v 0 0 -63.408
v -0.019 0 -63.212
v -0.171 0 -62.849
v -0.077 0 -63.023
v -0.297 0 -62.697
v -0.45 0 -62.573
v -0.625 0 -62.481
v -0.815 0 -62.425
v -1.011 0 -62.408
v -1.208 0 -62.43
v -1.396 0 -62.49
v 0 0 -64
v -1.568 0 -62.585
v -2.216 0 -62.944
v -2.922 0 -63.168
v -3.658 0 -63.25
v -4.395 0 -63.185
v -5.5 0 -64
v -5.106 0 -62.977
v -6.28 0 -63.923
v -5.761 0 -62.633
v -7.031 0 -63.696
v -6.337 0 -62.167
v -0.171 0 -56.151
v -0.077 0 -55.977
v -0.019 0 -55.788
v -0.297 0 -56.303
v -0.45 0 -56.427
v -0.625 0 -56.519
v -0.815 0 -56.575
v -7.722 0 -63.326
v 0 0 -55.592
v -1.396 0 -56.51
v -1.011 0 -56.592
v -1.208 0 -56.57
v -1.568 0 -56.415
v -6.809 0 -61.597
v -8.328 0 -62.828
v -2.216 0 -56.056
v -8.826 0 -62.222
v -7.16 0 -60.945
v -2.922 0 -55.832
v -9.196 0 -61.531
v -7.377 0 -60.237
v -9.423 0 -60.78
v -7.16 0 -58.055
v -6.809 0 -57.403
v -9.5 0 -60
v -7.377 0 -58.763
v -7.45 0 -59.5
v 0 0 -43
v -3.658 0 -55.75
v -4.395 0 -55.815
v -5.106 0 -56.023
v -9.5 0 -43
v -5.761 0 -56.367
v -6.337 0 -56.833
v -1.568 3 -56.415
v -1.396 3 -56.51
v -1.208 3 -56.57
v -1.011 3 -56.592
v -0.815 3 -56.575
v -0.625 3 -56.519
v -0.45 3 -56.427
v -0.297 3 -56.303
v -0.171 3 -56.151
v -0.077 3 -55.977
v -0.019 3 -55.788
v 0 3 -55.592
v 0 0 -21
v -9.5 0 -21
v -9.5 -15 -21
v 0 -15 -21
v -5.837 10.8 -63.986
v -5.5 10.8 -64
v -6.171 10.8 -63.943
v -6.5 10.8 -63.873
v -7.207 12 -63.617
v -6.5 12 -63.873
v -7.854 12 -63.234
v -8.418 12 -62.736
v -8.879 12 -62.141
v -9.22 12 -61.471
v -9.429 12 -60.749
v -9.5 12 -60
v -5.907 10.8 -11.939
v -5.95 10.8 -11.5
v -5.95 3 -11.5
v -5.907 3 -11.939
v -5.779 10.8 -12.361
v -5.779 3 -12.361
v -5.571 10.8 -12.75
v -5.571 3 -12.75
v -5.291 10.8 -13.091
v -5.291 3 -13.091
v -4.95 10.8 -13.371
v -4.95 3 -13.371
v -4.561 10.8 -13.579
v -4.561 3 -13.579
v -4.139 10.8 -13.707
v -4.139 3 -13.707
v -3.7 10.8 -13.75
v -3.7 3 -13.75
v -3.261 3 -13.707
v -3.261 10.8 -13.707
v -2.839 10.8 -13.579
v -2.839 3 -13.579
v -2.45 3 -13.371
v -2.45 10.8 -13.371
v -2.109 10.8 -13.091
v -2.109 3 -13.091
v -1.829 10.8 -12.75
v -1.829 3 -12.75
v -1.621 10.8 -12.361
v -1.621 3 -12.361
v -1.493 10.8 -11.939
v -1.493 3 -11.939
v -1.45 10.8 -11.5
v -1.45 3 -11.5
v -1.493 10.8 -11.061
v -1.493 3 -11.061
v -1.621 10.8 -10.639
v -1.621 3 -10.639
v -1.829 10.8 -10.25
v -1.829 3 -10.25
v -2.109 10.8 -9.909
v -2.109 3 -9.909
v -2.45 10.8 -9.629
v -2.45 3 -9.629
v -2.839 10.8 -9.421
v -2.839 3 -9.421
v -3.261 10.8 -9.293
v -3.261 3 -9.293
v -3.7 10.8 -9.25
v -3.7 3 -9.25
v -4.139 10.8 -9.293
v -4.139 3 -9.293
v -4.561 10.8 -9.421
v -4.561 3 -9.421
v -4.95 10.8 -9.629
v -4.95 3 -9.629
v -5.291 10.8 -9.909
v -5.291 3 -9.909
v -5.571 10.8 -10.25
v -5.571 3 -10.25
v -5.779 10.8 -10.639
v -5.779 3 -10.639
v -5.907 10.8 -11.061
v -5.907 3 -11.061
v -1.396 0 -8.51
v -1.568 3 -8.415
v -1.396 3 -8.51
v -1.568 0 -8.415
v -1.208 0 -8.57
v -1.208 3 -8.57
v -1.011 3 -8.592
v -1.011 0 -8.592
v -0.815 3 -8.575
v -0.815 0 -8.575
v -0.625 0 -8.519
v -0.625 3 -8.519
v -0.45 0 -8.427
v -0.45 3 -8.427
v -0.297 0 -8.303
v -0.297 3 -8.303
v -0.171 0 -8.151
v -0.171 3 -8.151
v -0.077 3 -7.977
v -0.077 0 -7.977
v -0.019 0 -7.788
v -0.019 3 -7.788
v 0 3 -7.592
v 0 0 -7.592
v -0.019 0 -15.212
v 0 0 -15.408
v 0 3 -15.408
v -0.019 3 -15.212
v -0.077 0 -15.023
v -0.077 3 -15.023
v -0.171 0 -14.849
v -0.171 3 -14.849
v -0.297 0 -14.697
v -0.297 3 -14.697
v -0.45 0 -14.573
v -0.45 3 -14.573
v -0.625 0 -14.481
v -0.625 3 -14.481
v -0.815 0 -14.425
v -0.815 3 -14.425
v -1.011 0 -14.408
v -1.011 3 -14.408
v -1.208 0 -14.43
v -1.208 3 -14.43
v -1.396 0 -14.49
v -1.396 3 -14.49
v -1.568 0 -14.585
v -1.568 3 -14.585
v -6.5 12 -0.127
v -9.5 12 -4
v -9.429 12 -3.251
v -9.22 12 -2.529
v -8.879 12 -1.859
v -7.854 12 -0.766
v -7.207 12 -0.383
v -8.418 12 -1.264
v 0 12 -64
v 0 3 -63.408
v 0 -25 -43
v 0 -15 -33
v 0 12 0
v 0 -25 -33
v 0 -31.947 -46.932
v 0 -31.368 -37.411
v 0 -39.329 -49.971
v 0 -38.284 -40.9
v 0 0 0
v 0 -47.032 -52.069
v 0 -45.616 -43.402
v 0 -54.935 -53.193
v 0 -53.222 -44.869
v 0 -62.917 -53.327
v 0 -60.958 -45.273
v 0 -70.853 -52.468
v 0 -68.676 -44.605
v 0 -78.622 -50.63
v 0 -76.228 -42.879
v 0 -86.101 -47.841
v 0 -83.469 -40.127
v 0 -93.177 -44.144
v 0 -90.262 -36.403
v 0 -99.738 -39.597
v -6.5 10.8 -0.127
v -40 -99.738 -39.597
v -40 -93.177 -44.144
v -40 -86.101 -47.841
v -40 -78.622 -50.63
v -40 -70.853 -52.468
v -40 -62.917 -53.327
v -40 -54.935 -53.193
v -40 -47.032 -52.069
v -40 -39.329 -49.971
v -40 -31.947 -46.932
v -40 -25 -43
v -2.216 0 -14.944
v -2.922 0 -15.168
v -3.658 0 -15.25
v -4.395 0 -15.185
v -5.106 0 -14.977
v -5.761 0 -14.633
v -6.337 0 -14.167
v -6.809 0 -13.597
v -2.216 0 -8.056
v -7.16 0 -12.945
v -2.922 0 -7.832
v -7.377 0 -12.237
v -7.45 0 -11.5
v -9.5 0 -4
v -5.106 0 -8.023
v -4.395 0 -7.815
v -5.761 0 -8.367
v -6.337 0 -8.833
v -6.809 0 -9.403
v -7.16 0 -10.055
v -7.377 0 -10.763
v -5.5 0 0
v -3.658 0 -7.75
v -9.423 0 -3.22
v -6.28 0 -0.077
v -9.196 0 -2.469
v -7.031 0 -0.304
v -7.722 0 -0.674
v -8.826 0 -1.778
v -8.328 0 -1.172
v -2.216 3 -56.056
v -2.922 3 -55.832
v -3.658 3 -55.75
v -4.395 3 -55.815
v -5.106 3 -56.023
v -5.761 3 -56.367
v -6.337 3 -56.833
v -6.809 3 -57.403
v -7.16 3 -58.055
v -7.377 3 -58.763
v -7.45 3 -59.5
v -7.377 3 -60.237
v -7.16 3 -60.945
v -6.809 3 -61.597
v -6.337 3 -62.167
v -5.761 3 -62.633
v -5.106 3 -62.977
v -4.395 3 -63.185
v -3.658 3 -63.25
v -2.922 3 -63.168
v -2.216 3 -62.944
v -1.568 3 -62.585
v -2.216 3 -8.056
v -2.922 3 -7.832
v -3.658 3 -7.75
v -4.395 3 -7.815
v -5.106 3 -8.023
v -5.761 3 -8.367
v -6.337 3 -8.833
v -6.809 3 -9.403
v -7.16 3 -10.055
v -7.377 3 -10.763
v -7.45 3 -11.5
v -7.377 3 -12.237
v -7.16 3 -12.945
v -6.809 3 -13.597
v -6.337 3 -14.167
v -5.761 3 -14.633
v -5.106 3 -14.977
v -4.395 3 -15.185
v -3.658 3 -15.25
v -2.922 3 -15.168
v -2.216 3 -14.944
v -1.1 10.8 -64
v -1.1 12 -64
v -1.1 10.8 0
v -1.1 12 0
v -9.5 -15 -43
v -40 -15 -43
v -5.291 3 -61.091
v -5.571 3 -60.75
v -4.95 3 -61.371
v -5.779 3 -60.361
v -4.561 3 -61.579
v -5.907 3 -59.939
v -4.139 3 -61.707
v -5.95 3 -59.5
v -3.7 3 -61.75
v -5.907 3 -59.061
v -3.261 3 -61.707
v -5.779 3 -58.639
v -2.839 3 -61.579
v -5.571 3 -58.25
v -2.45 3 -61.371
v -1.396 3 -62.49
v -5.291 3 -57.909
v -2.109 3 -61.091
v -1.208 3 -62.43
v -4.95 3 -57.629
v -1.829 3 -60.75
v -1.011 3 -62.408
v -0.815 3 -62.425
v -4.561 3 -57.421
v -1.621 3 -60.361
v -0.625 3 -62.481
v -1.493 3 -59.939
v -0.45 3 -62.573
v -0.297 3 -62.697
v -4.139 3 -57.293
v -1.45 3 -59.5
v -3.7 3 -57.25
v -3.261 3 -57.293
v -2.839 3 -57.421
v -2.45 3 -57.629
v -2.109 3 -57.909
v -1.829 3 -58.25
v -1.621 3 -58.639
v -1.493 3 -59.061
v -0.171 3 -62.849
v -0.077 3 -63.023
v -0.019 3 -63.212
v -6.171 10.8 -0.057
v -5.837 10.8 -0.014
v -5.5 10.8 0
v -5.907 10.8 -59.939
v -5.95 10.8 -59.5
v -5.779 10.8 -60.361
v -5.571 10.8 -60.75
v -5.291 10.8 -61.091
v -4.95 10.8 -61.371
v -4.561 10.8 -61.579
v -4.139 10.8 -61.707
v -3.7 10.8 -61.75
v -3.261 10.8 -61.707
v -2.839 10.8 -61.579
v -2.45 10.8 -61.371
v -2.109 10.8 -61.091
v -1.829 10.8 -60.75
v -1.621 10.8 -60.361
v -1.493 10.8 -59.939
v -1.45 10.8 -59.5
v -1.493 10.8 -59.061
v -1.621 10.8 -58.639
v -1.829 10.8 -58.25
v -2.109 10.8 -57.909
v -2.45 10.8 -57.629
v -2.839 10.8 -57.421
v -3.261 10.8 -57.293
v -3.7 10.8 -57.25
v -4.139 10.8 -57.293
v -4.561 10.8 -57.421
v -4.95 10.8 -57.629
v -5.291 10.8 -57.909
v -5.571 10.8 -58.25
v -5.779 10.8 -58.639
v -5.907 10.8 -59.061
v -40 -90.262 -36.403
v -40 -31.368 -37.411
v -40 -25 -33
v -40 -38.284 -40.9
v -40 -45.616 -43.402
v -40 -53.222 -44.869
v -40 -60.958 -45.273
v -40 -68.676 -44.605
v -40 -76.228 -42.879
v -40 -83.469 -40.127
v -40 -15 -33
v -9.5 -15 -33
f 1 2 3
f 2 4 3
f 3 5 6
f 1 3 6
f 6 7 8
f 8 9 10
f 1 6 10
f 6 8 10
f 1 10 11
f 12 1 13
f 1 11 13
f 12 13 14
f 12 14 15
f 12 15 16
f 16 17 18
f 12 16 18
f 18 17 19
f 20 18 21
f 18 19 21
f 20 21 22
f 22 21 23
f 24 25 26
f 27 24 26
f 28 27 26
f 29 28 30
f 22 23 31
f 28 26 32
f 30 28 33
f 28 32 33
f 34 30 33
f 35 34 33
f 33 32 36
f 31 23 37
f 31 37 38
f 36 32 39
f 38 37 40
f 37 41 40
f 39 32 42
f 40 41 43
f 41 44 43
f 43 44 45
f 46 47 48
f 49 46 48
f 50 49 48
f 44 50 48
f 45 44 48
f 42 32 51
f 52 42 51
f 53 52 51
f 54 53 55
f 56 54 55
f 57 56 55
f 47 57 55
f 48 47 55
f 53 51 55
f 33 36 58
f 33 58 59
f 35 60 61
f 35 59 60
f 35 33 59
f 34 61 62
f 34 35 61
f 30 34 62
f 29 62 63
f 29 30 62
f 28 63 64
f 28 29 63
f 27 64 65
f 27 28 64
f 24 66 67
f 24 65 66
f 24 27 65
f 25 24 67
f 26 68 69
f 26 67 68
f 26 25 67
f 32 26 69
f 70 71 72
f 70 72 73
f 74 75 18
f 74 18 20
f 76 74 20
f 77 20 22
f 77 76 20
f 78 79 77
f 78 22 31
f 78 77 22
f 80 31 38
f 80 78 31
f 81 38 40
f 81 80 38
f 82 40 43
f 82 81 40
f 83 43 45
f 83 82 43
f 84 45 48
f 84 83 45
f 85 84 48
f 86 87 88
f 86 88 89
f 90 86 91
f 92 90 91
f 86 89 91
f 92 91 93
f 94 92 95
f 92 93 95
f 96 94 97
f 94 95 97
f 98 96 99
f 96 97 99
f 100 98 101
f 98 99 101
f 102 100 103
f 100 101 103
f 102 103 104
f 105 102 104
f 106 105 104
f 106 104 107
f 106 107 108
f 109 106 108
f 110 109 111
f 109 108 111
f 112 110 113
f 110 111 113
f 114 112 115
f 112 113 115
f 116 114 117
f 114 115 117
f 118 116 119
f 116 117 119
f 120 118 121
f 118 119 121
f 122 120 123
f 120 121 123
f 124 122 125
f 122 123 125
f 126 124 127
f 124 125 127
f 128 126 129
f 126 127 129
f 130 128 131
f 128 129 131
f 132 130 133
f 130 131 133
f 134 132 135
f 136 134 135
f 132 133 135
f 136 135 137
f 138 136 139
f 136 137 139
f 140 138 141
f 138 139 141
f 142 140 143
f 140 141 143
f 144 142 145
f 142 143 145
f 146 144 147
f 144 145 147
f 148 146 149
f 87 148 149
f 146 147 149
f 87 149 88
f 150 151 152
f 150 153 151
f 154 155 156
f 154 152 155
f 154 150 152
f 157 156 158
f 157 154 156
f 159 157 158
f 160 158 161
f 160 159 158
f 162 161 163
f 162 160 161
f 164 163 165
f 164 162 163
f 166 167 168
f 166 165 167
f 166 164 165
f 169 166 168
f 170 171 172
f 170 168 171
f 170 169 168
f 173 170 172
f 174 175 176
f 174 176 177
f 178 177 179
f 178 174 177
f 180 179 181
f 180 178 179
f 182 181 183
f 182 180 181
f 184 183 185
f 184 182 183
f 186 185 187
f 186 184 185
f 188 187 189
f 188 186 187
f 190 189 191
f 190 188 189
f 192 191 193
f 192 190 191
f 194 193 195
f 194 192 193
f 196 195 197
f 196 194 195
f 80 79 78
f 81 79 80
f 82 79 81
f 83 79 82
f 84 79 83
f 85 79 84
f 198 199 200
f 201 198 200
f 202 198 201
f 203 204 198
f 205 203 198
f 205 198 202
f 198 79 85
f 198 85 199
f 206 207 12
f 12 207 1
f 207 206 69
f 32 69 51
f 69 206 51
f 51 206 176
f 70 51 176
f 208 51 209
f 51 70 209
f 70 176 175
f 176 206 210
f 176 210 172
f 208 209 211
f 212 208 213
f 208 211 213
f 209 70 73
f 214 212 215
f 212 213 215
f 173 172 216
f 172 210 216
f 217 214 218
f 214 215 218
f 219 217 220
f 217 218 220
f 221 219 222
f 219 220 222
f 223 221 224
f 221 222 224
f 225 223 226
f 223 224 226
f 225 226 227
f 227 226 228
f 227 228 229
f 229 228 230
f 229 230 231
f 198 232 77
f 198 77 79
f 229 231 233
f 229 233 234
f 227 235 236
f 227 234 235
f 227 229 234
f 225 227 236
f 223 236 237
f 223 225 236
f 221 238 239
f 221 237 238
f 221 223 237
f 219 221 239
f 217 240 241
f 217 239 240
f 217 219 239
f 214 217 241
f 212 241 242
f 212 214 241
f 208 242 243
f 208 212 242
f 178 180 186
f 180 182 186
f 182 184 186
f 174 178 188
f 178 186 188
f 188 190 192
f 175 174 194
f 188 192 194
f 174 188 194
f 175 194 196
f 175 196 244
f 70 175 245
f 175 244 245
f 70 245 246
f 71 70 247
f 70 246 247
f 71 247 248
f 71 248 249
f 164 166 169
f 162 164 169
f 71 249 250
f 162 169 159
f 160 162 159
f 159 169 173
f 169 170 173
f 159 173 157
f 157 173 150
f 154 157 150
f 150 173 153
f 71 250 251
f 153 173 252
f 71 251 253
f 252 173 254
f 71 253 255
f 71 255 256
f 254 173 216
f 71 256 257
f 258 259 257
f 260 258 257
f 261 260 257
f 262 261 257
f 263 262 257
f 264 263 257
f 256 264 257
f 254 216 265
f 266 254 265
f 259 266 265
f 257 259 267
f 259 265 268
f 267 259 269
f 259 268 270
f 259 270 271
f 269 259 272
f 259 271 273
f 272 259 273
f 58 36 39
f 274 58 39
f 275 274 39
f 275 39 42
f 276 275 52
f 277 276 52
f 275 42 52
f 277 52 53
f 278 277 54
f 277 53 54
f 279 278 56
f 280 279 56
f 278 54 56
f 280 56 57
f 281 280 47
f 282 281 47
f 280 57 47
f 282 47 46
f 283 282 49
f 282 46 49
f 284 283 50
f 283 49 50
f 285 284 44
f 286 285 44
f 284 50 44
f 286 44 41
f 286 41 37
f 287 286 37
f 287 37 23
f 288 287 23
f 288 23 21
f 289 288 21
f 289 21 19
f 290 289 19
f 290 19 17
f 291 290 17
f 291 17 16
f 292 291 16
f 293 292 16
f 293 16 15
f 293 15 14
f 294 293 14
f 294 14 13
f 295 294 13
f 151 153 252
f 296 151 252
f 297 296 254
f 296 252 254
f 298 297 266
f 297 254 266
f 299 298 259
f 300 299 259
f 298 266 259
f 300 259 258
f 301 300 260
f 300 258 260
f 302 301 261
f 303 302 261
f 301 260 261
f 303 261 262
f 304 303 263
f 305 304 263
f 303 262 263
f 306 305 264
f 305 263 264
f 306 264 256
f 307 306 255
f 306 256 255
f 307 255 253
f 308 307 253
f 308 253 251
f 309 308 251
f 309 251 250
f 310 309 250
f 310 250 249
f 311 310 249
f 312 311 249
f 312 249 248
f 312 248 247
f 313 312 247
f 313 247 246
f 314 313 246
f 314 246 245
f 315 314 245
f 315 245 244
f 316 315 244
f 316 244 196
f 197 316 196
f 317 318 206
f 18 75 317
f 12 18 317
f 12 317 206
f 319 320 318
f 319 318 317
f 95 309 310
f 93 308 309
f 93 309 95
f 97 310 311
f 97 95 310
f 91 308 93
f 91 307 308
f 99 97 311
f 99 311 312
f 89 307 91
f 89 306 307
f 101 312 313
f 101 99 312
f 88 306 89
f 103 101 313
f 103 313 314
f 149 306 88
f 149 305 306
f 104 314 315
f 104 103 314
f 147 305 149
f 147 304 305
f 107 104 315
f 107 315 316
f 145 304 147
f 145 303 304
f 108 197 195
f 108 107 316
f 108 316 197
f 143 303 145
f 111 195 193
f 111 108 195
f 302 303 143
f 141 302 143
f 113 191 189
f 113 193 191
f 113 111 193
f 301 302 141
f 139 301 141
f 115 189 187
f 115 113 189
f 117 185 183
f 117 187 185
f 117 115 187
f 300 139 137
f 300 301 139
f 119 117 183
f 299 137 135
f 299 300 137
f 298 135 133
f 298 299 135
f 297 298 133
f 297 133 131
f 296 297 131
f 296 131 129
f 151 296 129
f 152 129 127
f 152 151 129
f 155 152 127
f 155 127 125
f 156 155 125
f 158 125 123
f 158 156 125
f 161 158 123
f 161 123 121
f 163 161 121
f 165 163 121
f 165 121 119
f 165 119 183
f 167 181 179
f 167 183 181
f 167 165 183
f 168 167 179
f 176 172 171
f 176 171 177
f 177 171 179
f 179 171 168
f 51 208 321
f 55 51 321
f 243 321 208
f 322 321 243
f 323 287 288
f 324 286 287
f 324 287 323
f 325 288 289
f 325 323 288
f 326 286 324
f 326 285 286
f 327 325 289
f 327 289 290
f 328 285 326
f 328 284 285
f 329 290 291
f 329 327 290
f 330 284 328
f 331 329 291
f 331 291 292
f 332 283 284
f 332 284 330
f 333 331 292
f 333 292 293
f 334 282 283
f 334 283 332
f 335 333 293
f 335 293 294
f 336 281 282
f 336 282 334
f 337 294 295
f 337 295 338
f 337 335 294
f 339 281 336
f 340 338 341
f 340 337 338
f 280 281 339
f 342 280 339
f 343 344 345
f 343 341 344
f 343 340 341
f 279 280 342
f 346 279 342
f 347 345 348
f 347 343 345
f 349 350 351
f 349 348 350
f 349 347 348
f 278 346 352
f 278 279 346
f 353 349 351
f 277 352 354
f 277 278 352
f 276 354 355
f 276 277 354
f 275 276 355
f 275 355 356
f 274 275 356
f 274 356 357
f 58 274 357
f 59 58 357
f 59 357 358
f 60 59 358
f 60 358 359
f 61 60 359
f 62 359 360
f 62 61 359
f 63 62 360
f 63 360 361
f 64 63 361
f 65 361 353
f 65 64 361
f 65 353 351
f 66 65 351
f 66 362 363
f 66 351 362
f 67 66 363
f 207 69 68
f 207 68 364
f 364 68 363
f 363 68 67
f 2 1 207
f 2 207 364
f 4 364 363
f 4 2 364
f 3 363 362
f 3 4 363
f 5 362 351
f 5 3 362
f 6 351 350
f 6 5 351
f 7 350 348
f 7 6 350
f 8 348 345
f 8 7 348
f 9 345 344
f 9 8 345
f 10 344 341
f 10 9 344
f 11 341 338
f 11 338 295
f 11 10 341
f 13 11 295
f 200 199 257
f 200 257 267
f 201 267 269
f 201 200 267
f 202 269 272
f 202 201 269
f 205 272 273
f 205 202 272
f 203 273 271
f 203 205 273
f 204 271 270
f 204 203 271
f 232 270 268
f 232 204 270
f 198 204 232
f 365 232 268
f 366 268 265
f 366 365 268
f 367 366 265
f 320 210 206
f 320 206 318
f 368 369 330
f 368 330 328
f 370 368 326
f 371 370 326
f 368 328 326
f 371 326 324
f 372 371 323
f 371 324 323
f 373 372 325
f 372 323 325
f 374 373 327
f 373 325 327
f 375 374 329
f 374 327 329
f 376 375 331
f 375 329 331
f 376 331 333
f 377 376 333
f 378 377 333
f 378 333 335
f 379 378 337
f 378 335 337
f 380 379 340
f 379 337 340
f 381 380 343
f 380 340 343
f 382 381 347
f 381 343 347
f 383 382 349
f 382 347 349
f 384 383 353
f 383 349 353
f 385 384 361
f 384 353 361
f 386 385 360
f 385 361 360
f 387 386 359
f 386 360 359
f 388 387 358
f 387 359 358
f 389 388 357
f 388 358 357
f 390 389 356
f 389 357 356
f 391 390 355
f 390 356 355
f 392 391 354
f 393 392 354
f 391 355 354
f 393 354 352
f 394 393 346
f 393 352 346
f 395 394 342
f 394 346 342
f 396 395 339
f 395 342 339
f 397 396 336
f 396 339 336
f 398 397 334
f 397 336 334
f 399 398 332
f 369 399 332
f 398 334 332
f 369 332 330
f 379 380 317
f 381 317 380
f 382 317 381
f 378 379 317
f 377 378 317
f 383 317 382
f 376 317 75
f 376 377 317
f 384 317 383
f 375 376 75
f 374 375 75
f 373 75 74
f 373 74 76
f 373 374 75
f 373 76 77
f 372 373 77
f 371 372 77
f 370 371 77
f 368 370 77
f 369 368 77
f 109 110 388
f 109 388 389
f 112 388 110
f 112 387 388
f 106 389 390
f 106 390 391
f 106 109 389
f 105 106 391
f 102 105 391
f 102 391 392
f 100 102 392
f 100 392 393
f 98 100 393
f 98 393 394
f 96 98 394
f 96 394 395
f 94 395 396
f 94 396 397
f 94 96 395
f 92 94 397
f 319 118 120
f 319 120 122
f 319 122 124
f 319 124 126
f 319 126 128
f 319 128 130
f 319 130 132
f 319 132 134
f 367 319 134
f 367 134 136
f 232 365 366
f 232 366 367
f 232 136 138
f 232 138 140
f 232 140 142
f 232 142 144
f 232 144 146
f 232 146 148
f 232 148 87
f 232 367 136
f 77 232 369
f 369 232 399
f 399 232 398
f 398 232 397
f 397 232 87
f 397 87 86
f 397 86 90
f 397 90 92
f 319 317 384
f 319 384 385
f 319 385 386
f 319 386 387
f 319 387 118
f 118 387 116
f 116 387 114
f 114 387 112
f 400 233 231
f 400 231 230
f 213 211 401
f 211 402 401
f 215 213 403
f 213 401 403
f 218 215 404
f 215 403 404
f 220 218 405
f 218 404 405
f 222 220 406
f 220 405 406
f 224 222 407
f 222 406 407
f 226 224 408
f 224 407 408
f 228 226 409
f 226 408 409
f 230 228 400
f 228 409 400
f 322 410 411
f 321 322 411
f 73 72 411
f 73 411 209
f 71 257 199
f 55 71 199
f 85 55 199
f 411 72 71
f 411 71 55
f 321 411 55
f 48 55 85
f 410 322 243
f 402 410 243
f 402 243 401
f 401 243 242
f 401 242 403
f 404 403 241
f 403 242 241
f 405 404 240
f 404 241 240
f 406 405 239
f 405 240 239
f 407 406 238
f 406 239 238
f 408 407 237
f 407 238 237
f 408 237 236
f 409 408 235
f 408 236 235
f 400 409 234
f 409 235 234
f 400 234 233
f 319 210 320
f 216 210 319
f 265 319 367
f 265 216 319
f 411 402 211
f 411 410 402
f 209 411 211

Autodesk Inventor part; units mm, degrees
ref_plane "YZ Plane" through (0, 0, 0) normal (1, 0, 0) x (0, 1, 0)
ref_plane "XZ Plane" through (0, 0, 0) normal (0, 1, 0) x (-1, 0, 0)
ref_plane "XY Plane" through (0, 0, 0) normal (0, 0, 1) x (1, 0, 0)
sketch "Sketch1" plane through (0, 0, 0) normal (0, 1, 0) x (-1, 0, 0)
  line L0 (0, 0) -> (9.5, 0)
  line L1 (9.5, 0) -> (9.5, -64)
  line L2 (9.5, -64) -> (0, -64)
  line L3 (0, -64) -> (0, 0)
  circle A0 centre (3.7, -11.5) radius 2.25
  circle A1 centre (3.7, -59.5) radius 2.25
  line L4 (3.7, -11.5) -> (3.7, -59.5) construction
  dimension "d1" = 9.5
  dimension "d2" = 64
  dimension "d3" = 4.5
  dimension "d4" = 48
  dimension "d6" = 3.7
  dimension "d17" = 4.5
extrude "Extrusion1" add sketch "Sketch1" along normal blind 12
sketch "Sketch2" plane through (-9.5, 0, 0) normal (0, 0, 1) x (1, 0, 0)
  line L0 (9.5, 12) -> (0, 12) projected
  line L1 (3, 12) -> (8.4, 12)
  line L2 (8.4, 12) -> (8.4, 10.8)
  line L3 (8.4, 10.8) -> (3, 10.8)
  line L4 (3, 10.8) -> (3, 12)
  line L5 (9.5, 0) -> (9.5, 12) projected
  line L6 (3.55, 0) -> (8.05, 0) projected
  line L7 (3.55, 12) -> (8.05, 12) projected
  line L8 (9.5, 0) -> (9.5, 12) projected
  line L9 (9.5, 0) -> (9.5, 12) projected
  line L10 (3.55, 12) -> (8.05, 12) projected
  line L11 (3.55, 12) -> (3.55, 0) projected
  line L12 (3.55, 12) -> (8.05, 12) projected
  line L13 (3.55, 0) -> (8.05, 0) projected
  line L14 (3.55, 12) -> (8.05, 12) projected
  line L15 (3.55, 0) -> (8.05, 0) projected
  line L16 (3.55, 12) -> (8.05, 12) projected
  line L17 (3.55, 0) -> (8.05, 0) projected
  dimension "d9" = 1.1
  dimension "d10" = 5.4
  dimension "d11" = 1.2
  dimension "d76" = 12
extrude "Extrusion2" cut sketch "Sketch2" against normal up to next
sketch "Sketch3" plane through (0, 0, 0) normal (0, -1, 0) x (1, 0, 0)
  circle A0 centre (-3.7, -11.5) radius 2.25 projected
  circle A1 centre (-3.7, -11.5) radius 3.75
  circle A2 centre (-3.7, -59.5) radius 2.25 projected
  circle A3 centre (-3.7, -59.5) radius 3.75
  point P0 (0, 0)
  dimension "d14" = 7.5
extrude "Extrusion3" cut sketch "Sketch3" against normal blind 3
fillet "Fillet1" radius 1 4 edges at (0, 1.5, -58.8897) (0, 1.5, -60.1103) (0, 1.5, -10.8897) (0, 1.5, -12.1103)
fillet "Fillet2" radius 4 2 edges at (-9.5, 6, -64) (-9.5, 6, 0)
sketch "Sketch15" plane through (0, 0, 0) normal (0, -1, 0) x (1, 0, 0)
  line L0 (0, 0) -> (0, -7.592) projected
  line L1 (-9.5, -32) -> (-9.5, -21)
  line L2 (-9.5, -21) -> (0, -21)
  line L3 (0, -21) -> (0, -43)
  line L4 (0, -43) -> (-9.5, -43)
  line L5 (-9.5, -43) -> (-9.5, -32)
  dimension "d79" = 11
  dimension "d80" = 22
extrude "Extrusion15" add sketch "Sketch15" along normal blind 15
sketch "Sketch16" plane through (0, -15, 0) normal (0, -1, 0) x (1, 0, 0)
  line L0 (0, -43) -> (-9.5, -43) projected
  line L1 (0, -43) -> (-40, -43)
  line L2 (-40, -43) -> (-40, -33)
  line L3 (-40, -33) -> (0, -33)
  line L4 (0, -33) -> (0, -43)
  point P0 (0, 0)
  dimension "d83" = 40
  dimension "d84" = 10
extrude "Extrusion16" add sketch "Sketch16" along normal blind 10
sketch "Sketch17" plane through (0, -25, 0) normal (0, -1, 0) x (1, 0, 0)
  line L0 (0, -33) -> (0, -21) projected
  line L1 (-40, -43) -> (-9.5, -43) projected
  line L2 (0, -33) -> (-40, -33)
  line L3 (-40, -33) -> (-40, -43)
  line L4 (-40, -43) -> (0, -43)
  line L5 (0, -43) -> (0, -33)
  point P0 (0, 0)
  point P1 (-9.5, -43)
sketch "Sketch18" plane through (-40, -15, -43) normal (-1, 0, 0) x (0, 0, 1)
  line L0 (0, -10) -> (10, -10) projected
  arc A0 (5, -10) -> (5, -80) centre (53.734, -45) ccw
  point P0 (43, 15)
  dimension "d87" = 70
  dimension "d88" = 60
sweep "Sweep1" add profiles "Sketch17" path "Sketch18" path curves A0
properties part number "Back"
